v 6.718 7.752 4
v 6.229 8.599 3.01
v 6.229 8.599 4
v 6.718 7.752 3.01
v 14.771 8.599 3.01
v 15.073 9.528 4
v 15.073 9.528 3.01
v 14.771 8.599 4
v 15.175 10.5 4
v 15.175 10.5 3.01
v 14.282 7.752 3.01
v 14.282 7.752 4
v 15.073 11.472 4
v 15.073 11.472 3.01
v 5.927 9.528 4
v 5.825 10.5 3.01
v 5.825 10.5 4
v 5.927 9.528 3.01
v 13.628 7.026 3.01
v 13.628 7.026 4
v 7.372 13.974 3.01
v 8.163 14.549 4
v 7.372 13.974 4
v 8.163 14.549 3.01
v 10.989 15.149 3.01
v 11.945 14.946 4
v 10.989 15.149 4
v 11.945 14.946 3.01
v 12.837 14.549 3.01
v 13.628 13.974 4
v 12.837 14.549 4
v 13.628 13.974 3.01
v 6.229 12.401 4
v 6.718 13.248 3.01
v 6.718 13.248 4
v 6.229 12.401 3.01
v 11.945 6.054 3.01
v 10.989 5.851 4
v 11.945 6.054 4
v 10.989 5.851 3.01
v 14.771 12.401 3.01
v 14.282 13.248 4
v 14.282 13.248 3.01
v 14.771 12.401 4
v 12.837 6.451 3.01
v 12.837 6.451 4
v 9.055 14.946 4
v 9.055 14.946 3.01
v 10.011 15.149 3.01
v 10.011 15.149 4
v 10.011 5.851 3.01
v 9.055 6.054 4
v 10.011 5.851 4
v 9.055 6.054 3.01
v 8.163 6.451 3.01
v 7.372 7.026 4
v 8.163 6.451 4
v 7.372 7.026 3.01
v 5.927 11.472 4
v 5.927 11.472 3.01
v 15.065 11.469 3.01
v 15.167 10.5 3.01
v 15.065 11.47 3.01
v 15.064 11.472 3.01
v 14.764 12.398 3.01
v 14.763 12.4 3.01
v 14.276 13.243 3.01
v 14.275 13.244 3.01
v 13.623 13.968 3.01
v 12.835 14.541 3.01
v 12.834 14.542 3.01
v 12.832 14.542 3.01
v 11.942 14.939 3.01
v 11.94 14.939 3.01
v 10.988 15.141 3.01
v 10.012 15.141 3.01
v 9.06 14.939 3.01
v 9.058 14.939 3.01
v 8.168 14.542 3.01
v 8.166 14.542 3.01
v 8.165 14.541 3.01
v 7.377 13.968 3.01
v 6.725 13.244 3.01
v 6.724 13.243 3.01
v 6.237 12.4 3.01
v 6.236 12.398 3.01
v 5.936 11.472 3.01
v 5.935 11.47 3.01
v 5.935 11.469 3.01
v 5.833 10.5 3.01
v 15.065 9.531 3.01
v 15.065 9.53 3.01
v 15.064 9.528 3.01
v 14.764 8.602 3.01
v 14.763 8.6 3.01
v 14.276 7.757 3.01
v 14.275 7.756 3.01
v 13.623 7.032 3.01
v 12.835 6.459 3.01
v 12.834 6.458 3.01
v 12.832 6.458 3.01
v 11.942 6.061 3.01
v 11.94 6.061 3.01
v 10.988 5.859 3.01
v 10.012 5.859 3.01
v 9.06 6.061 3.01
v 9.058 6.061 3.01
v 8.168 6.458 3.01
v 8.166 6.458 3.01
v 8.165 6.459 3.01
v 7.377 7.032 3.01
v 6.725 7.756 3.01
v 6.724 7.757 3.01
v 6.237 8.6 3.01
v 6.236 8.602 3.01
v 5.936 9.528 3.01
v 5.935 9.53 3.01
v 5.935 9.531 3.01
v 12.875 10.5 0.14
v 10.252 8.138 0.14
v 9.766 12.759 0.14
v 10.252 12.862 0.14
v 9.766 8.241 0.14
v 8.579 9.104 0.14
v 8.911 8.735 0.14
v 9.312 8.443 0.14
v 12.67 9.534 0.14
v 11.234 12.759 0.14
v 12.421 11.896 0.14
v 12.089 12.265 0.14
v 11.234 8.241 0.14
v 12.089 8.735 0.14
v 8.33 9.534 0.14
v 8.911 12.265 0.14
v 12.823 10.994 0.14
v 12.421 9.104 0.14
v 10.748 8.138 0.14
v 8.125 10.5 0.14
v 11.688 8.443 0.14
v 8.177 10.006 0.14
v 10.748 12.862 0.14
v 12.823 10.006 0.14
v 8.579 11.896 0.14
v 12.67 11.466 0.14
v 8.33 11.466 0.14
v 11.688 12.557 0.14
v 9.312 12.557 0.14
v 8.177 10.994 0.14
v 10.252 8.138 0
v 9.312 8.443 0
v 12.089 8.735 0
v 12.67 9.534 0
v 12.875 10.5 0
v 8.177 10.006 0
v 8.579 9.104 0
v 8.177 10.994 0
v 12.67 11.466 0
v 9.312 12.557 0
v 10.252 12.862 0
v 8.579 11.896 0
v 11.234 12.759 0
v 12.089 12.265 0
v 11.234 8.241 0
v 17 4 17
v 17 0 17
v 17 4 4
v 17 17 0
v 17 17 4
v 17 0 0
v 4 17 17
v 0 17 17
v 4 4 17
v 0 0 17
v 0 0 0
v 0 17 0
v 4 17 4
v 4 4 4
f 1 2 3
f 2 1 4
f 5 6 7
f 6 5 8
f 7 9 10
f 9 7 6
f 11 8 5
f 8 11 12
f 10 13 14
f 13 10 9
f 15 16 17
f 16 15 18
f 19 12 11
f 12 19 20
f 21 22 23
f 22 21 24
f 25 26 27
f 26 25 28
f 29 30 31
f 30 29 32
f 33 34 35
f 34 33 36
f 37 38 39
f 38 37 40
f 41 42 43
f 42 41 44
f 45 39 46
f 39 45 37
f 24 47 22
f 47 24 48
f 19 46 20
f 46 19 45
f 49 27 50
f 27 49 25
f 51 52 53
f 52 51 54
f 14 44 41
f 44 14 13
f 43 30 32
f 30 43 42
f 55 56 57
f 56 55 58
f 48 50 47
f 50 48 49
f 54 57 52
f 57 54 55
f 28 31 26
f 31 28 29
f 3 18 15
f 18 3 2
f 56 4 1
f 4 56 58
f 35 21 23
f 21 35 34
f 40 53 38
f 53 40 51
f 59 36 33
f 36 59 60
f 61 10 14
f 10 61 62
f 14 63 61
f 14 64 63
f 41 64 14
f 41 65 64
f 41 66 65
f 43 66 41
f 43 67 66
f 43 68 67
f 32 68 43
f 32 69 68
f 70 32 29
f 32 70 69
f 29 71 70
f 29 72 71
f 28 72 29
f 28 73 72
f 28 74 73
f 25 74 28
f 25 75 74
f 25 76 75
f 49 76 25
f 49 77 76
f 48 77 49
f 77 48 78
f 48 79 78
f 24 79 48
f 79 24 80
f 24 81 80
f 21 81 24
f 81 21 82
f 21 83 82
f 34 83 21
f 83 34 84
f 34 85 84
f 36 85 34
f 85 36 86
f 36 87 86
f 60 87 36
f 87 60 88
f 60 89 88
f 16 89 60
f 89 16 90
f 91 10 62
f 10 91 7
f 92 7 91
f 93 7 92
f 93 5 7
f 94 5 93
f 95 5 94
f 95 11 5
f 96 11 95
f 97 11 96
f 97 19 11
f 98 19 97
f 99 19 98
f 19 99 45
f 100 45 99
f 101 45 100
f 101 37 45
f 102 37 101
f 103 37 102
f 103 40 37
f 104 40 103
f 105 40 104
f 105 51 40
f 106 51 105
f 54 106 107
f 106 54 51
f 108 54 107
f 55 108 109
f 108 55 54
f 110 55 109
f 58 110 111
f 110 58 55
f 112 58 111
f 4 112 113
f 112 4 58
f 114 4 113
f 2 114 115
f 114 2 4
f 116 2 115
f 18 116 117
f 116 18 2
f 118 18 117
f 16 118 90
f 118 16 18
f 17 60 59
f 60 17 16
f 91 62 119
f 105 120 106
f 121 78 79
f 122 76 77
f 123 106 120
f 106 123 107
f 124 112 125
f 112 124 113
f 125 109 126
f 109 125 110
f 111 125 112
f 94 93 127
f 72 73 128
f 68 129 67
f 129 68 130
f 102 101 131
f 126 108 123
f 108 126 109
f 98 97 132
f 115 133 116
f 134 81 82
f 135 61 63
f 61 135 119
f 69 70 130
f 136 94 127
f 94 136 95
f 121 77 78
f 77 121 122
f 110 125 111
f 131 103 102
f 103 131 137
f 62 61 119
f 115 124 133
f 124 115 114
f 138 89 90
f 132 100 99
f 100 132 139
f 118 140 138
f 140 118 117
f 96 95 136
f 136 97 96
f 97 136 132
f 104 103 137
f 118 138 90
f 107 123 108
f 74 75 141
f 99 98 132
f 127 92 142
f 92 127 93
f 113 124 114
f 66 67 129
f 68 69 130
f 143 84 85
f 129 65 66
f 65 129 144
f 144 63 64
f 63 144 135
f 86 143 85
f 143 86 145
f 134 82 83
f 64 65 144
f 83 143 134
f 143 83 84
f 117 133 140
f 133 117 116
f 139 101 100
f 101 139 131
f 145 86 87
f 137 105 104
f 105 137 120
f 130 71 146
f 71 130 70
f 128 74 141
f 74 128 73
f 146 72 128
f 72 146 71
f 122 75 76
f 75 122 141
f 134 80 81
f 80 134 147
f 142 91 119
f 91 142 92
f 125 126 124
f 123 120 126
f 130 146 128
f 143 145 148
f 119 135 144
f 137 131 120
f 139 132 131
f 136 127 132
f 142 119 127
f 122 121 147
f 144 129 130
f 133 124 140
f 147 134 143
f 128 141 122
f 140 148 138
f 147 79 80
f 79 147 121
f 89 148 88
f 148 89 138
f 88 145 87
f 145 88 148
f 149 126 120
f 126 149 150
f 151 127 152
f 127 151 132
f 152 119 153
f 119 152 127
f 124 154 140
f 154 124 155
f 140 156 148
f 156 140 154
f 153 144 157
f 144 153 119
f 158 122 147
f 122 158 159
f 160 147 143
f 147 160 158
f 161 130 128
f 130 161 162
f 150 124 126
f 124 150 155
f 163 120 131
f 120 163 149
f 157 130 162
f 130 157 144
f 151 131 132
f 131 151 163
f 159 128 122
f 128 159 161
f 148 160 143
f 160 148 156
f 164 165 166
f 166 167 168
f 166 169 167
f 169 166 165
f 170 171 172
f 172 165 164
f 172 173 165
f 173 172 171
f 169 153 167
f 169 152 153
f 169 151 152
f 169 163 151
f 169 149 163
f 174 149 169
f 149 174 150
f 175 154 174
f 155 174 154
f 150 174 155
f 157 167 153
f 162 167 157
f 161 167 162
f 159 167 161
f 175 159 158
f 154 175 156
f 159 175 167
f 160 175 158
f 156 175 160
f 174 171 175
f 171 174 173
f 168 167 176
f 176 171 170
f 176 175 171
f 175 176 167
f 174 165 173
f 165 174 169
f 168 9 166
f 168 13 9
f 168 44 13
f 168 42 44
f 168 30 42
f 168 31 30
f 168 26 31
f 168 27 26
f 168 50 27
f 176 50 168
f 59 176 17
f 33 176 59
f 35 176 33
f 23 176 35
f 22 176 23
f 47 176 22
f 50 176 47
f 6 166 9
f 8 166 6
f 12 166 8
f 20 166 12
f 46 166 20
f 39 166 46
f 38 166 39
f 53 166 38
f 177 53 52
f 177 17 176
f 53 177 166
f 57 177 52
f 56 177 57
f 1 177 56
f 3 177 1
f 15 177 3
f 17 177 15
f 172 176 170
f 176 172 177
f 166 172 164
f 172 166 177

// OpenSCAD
// file: screws.scad
module screw_hole(screw_shank_diameter, screw_head_diameter, screw_head_height, smidge = 0.01) {
  union() {
    cylinder(d = screw_head_diameter, h = 1, $fa = 1, $fs = 1);
    translate([0, 0, 1 - smidge]) {
      cylinder(d = screw_head_diameter, d2 = screw_shank_diameter, h = screw_head_height - 1 + smidge, $fa = 1, $fs = 1);
    }
    translate([0, 0, screw_head_height - smidge]) {
      cylinder(d = screw_shank_diameter, h = 100, $fa = 1, $fs = 1);
    }
  }
}
// main file
include <screws.scad>;

module corner(size = 15, wall_thickness = 3, screw_shank_diameter = 4, screw_head_diameter = 9, screw_head_height = 2, smidge = 0.01) {
  difference() {
    cube([size, size, size]);
    translate([wall_thickness, wall_thickness, wall_thickness]) {
      cube([size, size, size]);
    }
    translate([wall_thickness + (size - wall_thickness)/2, wall_thickness + (size - wall_thickness)/2, wall_thickness + smidge]) {
      rotate([180, 0, 0]) screw_hole(screw_shank_diameter, screw_head_diameter, screw_head_height, smidge);
    }
  }
}

corner(size = 17, wall_thickness = 4, screw_shank_diameter = 4.75, screw_head_diameter = 9.35, screw_head_height = 3.87);
